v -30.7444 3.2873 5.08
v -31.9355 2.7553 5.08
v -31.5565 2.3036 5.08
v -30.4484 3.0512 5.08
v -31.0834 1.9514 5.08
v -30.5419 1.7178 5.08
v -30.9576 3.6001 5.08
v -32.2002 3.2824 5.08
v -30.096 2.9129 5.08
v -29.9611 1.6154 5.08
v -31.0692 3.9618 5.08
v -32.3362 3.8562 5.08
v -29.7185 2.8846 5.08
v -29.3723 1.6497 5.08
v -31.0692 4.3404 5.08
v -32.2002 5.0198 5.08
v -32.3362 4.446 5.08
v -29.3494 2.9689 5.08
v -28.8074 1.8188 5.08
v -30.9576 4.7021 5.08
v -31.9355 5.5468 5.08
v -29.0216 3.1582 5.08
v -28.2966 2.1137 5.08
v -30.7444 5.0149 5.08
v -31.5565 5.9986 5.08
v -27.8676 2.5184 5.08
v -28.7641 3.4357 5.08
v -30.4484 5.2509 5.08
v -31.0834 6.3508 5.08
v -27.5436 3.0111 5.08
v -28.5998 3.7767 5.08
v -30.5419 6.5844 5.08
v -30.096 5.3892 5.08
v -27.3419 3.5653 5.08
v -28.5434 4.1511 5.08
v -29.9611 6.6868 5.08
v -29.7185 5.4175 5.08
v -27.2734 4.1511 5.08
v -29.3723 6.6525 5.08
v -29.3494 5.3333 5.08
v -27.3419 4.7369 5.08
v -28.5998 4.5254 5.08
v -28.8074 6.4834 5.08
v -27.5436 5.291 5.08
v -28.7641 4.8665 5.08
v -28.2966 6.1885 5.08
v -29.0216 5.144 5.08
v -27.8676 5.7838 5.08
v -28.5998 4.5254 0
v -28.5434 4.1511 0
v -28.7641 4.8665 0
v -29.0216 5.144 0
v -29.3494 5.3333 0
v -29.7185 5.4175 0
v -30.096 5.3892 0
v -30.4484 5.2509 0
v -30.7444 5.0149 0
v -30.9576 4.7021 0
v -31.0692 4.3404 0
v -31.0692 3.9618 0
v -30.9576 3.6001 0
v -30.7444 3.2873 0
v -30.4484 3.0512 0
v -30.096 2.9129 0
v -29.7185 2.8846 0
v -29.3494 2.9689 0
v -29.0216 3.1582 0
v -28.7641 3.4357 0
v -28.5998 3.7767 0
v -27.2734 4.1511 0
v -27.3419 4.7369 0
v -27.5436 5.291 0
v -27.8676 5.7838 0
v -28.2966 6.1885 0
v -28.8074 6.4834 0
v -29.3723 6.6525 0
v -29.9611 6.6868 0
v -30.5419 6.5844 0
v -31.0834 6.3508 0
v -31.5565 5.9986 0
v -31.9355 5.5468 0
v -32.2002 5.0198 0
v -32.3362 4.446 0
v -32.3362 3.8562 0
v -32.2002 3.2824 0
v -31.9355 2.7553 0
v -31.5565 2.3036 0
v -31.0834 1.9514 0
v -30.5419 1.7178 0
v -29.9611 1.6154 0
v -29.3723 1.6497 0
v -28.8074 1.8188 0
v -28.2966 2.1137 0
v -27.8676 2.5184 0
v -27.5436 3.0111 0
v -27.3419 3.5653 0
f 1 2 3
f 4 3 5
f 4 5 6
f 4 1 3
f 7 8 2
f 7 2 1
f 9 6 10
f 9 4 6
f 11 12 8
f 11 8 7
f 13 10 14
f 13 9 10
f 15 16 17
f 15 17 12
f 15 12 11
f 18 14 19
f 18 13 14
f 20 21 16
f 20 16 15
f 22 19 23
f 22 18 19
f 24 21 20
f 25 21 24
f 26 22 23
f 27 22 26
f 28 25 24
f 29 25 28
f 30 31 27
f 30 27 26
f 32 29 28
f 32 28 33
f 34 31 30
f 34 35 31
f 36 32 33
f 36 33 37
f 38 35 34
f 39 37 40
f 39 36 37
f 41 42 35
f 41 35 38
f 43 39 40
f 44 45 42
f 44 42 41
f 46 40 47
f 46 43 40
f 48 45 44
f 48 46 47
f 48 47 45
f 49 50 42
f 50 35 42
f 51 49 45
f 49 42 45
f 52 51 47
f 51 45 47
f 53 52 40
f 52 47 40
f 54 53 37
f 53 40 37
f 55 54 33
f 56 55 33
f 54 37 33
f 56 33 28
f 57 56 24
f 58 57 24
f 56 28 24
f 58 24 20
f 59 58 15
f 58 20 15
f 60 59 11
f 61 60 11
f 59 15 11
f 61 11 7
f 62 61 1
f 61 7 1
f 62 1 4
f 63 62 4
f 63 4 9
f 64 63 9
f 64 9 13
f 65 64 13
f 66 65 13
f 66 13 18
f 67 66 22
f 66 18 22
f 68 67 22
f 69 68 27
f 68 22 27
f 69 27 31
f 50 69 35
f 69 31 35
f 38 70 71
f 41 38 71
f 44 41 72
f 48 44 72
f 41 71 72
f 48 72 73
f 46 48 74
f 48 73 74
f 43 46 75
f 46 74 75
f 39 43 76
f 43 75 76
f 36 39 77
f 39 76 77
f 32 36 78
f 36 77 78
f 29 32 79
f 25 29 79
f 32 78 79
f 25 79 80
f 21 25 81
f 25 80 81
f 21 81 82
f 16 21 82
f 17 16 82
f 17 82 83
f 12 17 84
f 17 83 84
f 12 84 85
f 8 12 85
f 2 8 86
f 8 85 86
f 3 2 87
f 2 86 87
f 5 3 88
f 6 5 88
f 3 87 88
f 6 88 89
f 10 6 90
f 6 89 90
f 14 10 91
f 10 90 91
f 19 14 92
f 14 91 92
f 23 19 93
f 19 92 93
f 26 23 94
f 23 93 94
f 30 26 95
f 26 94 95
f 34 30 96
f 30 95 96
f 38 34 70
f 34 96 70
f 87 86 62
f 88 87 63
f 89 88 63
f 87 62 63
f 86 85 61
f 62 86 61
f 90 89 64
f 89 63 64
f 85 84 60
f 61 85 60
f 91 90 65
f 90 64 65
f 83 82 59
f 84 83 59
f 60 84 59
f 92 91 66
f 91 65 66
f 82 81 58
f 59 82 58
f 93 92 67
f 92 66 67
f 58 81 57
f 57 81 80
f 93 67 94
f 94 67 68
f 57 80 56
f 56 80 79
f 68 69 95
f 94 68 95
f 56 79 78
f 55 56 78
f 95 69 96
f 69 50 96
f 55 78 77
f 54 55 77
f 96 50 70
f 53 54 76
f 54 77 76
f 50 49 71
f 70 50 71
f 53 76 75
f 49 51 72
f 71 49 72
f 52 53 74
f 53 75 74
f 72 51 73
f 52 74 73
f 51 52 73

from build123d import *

# Parameters (mm, degrees)
F0_R     = 12.192
F1_DEPTH = 24.13
F3_R     = 2.54
F4_DEPTH = 5.08
F5_R     = 1.27
F6_DEPTH = 12.7


with BuildPart() as f1:
    # F0 (on Top) → F1 (new body)
    with BuildSketch(Plane.XY):
        with Locations((-42.4534301028, 33.8528162107)):
            Circle(F0_R)
    extrude(amount=F1_DEPTH)


with BuildPart() as f4:
    # F3 (on Top) → F4 (new body)
    with BuildSketch(Plane.XY):
        with Locations((-29.813402482, 4.1510883982)):
            Circle(F3_R)
    extrude(amount=F4_DEPTH)

    # F5 (on Top) → F6 (cut, symmetric)
    with BuildSketch(Plane.XY):
        with Locations((-29.813402482, 4.1510883982)):
            Circle(F5_R)
    extrude(amount=F6_DEPTH, both=True, mode=Mode.SUBTRACT)


solid = f4.part
